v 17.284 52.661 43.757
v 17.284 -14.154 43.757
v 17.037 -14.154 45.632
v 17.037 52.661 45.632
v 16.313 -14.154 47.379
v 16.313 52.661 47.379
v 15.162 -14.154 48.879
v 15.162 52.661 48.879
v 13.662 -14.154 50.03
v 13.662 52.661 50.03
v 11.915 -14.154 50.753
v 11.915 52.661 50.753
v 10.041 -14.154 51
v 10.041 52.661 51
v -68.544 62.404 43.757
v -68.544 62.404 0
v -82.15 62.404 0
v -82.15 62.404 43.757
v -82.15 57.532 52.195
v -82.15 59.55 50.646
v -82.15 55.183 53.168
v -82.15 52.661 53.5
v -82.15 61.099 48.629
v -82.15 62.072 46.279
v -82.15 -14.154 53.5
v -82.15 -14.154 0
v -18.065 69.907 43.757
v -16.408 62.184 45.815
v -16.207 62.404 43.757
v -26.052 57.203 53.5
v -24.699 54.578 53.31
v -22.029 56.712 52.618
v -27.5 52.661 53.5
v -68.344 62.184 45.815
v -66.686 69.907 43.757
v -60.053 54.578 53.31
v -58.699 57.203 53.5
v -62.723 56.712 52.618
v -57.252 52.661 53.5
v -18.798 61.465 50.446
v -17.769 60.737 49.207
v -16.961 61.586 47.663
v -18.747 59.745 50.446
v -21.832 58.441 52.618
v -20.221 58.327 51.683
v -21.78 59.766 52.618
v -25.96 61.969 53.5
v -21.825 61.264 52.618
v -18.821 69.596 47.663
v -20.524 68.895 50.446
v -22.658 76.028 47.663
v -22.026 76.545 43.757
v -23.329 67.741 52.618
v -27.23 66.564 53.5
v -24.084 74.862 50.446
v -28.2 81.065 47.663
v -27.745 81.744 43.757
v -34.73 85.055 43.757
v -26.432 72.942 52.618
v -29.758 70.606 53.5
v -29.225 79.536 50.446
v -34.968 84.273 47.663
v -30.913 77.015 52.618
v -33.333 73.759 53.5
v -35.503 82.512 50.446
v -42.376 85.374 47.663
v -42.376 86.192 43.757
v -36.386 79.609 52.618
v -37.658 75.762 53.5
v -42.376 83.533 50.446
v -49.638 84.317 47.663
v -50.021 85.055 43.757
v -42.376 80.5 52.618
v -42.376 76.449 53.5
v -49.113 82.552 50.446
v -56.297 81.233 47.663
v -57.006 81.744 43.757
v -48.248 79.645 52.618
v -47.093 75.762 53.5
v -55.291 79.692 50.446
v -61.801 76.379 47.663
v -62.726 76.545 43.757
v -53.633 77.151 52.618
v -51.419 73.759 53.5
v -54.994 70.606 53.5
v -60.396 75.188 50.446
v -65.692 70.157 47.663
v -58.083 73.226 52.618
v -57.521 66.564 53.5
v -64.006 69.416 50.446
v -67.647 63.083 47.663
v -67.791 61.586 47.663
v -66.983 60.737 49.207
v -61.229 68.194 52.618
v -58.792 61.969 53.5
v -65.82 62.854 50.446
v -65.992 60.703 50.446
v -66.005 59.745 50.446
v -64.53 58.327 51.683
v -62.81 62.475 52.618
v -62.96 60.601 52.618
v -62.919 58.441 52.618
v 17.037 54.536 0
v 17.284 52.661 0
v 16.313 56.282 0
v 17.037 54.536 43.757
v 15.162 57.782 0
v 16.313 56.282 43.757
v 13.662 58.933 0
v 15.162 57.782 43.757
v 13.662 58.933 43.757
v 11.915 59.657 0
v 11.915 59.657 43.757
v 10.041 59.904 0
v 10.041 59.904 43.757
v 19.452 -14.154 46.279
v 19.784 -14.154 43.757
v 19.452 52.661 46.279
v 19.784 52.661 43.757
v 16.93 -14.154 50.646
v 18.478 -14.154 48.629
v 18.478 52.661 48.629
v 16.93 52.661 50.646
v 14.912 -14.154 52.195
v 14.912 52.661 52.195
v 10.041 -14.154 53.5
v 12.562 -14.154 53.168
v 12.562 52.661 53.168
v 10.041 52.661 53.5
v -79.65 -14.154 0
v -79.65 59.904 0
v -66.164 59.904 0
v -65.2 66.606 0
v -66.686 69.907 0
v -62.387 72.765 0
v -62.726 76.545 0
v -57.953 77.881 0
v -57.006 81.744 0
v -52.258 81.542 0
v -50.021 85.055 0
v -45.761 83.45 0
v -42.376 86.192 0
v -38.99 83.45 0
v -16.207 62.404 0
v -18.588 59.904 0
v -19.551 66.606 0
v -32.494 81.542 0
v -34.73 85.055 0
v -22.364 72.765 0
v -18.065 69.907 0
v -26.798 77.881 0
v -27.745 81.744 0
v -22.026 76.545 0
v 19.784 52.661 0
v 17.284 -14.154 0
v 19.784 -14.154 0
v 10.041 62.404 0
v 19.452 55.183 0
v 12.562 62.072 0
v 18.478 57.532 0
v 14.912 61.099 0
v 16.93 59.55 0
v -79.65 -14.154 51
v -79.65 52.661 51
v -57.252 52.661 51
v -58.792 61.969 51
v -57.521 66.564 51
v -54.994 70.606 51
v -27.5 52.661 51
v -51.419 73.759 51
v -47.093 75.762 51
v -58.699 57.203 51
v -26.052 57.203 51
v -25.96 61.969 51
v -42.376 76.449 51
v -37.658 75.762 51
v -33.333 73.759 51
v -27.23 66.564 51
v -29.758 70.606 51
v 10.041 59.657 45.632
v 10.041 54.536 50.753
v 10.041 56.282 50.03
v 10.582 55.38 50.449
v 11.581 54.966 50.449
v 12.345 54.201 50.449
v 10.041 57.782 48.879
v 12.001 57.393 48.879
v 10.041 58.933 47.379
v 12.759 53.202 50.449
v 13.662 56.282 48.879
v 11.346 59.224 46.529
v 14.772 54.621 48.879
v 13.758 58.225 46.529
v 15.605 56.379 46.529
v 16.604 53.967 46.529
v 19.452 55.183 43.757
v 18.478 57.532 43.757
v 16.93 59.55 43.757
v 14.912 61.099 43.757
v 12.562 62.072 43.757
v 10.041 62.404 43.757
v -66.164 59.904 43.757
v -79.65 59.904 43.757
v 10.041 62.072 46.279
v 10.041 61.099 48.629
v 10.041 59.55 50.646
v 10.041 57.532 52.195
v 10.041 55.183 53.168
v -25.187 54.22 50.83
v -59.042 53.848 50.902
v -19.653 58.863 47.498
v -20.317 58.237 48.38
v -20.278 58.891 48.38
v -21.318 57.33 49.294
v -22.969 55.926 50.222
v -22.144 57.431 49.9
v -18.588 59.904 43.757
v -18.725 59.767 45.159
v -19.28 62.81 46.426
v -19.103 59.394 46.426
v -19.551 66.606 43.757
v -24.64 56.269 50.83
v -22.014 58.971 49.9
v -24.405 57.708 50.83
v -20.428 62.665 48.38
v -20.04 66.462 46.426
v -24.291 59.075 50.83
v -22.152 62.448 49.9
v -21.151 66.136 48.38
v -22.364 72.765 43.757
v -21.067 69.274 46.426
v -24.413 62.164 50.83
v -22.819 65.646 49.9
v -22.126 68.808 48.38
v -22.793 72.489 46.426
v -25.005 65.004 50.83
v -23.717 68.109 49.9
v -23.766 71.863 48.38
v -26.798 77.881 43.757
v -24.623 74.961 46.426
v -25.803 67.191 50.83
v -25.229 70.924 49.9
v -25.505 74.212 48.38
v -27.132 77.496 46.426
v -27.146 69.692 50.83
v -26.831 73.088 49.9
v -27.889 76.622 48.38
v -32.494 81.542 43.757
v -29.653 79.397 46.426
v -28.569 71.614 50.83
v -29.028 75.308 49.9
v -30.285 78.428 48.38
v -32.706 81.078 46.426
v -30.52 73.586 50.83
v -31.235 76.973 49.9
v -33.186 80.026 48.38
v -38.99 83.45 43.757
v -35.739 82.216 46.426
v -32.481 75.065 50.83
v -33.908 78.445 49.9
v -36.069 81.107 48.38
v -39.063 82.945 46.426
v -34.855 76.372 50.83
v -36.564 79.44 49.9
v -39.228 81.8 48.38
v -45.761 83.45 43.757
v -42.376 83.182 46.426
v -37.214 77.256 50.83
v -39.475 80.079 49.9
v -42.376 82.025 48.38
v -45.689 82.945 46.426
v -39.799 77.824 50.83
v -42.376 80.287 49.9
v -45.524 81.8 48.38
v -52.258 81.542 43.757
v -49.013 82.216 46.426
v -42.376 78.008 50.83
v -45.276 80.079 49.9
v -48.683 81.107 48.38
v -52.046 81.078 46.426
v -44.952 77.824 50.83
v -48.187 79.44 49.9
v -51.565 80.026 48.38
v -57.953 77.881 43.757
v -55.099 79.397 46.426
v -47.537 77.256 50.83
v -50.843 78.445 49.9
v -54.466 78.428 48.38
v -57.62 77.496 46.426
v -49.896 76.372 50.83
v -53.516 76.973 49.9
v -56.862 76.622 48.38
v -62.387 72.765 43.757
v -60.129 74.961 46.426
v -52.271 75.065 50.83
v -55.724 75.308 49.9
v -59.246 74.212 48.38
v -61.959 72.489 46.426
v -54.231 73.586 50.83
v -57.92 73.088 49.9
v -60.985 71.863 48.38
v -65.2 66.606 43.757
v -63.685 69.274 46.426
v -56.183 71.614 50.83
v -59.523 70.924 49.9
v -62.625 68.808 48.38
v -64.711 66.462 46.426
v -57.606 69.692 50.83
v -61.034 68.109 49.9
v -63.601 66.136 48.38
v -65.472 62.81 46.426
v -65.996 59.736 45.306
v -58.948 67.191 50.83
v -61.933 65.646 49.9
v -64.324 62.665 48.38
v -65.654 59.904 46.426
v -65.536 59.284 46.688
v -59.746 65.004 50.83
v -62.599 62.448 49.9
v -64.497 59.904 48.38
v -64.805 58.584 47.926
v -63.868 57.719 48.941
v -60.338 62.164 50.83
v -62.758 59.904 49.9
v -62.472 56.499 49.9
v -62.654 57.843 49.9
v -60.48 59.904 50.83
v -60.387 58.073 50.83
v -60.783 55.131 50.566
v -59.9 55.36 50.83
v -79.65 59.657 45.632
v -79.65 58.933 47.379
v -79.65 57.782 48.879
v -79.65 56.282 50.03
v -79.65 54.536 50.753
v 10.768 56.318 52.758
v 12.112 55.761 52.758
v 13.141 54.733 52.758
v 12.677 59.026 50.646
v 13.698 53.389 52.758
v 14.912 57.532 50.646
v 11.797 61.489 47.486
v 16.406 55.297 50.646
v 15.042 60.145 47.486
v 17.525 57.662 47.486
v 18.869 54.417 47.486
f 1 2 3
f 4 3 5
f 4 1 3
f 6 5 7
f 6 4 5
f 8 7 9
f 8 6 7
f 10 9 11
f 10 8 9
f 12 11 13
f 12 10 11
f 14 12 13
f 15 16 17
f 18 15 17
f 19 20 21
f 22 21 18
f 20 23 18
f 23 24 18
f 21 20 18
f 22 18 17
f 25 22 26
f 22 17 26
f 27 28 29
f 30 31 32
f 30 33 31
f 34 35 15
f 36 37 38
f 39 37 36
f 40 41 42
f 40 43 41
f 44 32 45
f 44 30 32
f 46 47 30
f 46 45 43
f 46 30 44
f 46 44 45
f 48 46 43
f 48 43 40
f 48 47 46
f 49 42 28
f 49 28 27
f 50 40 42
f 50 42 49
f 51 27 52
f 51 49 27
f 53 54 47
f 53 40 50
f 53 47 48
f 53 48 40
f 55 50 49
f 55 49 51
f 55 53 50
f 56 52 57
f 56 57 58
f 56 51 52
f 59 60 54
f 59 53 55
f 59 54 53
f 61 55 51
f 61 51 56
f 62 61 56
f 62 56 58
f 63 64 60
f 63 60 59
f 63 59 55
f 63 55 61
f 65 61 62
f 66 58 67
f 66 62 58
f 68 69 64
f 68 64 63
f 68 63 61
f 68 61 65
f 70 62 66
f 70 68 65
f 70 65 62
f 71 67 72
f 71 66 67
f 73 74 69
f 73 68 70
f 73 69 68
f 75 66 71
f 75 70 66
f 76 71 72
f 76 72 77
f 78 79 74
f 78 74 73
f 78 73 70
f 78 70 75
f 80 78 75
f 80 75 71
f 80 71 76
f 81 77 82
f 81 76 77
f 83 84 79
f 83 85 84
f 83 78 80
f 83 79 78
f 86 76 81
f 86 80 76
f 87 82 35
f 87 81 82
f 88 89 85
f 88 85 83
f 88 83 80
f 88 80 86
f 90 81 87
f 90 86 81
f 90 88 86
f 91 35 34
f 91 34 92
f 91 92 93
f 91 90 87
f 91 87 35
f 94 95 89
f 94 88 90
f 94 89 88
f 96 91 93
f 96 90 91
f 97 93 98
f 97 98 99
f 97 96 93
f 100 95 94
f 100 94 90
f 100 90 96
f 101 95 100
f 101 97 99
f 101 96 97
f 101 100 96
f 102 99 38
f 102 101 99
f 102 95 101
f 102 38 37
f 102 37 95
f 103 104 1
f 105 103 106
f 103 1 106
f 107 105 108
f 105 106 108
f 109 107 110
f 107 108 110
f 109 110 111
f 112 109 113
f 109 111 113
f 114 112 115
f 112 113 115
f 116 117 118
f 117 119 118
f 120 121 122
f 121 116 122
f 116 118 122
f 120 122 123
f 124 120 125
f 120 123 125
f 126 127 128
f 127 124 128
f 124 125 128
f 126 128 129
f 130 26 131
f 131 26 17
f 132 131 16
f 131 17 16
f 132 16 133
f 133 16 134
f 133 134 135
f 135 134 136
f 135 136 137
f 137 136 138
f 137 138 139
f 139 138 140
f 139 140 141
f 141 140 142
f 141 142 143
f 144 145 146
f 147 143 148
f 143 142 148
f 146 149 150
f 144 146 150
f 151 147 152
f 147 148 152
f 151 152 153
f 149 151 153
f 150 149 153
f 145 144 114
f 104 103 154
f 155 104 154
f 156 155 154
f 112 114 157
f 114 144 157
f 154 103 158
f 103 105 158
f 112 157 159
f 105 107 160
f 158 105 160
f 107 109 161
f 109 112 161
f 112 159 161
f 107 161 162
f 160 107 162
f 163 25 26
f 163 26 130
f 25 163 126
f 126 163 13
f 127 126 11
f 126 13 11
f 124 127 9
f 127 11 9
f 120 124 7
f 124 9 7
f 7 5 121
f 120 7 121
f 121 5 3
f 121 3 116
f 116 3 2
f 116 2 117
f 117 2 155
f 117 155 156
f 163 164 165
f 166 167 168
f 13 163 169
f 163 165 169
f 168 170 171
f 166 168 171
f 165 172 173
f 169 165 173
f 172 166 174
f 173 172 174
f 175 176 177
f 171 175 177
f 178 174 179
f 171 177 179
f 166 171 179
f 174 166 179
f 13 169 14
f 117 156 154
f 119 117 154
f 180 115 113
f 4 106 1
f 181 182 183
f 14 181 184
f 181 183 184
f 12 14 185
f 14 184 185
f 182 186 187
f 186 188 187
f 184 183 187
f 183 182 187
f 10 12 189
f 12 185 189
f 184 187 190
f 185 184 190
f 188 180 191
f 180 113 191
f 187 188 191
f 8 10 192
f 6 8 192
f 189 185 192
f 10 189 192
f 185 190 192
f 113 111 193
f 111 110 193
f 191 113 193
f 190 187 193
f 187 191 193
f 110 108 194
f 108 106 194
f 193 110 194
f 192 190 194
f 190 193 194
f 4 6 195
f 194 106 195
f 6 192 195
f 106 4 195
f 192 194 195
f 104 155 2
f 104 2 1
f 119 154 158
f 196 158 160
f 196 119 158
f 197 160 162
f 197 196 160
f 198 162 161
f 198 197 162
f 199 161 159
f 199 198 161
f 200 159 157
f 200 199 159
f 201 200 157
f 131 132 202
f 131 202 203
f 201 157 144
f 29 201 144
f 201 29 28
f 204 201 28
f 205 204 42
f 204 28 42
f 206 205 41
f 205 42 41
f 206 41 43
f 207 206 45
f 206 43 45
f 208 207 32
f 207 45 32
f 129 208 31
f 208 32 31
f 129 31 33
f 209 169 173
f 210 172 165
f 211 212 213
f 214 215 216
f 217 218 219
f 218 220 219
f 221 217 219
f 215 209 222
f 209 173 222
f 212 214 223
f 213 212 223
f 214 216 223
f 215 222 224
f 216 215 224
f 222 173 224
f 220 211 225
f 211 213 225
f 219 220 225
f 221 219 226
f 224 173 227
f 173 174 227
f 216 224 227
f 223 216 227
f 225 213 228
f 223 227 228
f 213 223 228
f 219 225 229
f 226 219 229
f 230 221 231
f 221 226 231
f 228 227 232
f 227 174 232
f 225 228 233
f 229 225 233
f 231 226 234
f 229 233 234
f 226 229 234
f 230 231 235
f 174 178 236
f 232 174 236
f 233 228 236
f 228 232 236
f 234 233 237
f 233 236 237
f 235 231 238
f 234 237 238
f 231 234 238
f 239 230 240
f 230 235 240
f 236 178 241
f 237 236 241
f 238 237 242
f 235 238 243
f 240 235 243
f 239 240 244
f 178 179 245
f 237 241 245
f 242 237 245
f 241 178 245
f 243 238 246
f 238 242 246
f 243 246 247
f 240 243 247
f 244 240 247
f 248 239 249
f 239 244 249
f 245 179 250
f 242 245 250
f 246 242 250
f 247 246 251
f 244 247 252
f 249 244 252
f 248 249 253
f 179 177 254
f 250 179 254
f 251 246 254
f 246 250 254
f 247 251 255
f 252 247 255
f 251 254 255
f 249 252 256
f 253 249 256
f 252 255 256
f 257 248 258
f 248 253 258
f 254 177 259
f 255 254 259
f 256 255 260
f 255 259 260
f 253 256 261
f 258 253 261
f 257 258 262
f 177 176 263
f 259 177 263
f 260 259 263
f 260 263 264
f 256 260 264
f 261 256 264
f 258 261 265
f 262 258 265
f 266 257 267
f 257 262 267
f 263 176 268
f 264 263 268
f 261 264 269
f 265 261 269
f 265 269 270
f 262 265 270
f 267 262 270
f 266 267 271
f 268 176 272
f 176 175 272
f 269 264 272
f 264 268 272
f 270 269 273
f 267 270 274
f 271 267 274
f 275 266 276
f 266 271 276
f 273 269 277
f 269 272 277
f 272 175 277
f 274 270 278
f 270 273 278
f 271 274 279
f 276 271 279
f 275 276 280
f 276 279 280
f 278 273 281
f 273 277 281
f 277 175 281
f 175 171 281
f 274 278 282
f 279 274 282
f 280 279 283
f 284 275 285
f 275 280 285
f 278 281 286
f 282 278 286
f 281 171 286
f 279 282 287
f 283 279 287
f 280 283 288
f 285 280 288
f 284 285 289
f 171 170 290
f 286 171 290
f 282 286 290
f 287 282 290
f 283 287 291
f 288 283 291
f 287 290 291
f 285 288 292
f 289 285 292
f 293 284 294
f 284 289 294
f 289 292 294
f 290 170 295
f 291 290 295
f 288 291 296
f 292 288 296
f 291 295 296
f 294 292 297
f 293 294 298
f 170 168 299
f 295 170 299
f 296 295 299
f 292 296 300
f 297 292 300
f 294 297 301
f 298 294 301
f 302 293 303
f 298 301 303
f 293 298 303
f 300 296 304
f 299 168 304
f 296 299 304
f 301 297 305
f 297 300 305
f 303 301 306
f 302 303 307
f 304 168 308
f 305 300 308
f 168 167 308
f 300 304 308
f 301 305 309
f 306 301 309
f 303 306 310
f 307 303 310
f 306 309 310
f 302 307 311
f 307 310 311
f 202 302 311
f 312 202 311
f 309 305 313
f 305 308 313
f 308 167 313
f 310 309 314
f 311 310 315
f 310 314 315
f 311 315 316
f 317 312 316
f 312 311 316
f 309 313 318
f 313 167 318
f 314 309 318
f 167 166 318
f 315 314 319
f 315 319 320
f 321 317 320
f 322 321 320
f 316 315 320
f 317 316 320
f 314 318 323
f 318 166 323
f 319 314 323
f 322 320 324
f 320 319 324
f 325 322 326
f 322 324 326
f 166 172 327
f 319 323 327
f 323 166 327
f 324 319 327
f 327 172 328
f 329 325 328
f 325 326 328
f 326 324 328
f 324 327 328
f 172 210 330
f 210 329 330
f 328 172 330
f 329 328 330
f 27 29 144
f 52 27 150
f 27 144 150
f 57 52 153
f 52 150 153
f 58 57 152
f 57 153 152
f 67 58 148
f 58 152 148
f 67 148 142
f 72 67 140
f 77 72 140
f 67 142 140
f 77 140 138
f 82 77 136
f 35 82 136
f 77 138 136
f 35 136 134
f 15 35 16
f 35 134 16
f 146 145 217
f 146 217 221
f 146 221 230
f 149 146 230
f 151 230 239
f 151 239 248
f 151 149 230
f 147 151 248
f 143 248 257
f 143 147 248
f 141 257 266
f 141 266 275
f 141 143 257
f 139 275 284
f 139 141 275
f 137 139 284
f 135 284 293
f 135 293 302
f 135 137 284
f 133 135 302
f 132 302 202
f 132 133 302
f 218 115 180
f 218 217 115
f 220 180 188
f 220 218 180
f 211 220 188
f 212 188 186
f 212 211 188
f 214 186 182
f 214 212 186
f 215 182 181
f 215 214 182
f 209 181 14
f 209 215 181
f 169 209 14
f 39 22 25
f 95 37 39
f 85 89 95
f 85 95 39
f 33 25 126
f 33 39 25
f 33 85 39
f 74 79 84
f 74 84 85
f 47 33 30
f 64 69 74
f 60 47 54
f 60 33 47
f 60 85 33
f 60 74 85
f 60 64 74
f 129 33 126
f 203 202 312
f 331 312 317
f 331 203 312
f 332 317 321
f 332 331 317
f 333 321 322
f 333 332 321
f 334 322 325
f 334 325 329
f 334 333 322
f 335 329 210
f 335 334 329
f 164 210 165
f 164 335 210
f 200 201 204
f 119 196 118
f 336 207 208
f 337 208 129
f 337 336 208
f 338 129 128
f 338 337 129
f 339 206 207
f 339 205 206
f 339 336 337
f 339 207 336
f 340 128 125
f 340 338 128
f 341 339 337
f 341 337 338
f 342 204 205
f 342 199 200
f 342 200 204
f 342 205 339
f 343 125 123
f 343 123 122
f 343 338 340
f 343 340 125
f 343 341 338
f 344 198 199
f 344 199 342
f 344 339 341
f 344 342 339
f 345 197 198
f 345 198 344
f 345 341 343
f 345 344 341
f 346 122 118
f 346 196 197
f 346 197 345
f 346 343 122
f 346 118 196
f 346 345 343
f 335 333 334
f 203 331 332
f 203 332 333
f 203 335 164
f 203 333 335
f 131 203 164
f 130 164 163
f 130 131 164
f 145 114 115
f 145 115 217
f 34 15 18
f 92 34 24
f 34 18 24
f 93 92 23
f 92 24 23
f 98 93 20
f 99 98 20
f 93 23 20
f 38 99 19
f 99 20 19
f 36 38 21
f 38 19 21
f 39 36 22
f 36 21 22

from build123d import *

# Parameters (mm, degrees)
F1_DEPTH = 51
F2_R     = 7.2426406871
F3_T     = 2.5


with BuildPart() as f1:
    # F0 (on Top) → F1 (new body)
    with BuildSketch(Plane.XY):
        with BuildLine():
            ThreePointArc((-66.1636230606, 59.9037967622), (-42.3757210374, 36.115894739), (-18.5878190141, 59.9037967622))
            Line((-18.5878190141, 59.9037967622), (-66.1636230606, 59.9037967622))
        make_face()
        with BuildLine():
            Line((-66.1636230606, 59.9037967622), (-18.5878190141, 59.9037967622))
            ThreePointArc((-18.5878190141, 59.9037967622), (-42.3757210374, 83.6916987855), (-66.1636230606, 59.9037967622))
        make_face()
        with BuildLine():
            Line((17.2835066915, 59.9037967622), (-18.5878190141, 59.9037967622))
            ThreePointArc((-18.5878190141, 59.9037967622), (-42.3757210374, 36.115894739), (-66.1636230606, 59.9037967622))
            Line((-66.1636230606, 59.9037967622), (-79.6502381563, 59.9037967622))
            Line((-79.6502381563, 59.9037967622), (-79.6502381563, -14.1544044018))
            Line((-79.6502381563, -14.1544044018), (17.2835066915, -14.1544044018))
            Line((17.2835066915, -14.1544044018), (17.2835066915, 59.9037967622))
        make_face()
    extrude(amount=F1_DEPTH)

    # F2
    f2_edges = [f1.edges().sort_by_distance(p)[0] for p in [
        (17.283507, 59.903797, 25.5),
        (-0.652156, 59.903797, 51),
        (17.283507, 22.874696, 51),
        (-42.375721, 83.691699, 51),
        (-72.906931, 59.903797, 51),
    ]]
    fillet(f2_edges, radius=F2_R)

    # F3
    f3_openings = [f1.faces().sort_by_distance(p)[0] for p in [
        (-31.290289, -14.154404, 25.445494),
        (-32.483683, 28.024527, 0),
    ]]
    offset(amount=F3_T, openings=f3_openings, kind=Kind.INTERSECTION)


solid = f1.part
